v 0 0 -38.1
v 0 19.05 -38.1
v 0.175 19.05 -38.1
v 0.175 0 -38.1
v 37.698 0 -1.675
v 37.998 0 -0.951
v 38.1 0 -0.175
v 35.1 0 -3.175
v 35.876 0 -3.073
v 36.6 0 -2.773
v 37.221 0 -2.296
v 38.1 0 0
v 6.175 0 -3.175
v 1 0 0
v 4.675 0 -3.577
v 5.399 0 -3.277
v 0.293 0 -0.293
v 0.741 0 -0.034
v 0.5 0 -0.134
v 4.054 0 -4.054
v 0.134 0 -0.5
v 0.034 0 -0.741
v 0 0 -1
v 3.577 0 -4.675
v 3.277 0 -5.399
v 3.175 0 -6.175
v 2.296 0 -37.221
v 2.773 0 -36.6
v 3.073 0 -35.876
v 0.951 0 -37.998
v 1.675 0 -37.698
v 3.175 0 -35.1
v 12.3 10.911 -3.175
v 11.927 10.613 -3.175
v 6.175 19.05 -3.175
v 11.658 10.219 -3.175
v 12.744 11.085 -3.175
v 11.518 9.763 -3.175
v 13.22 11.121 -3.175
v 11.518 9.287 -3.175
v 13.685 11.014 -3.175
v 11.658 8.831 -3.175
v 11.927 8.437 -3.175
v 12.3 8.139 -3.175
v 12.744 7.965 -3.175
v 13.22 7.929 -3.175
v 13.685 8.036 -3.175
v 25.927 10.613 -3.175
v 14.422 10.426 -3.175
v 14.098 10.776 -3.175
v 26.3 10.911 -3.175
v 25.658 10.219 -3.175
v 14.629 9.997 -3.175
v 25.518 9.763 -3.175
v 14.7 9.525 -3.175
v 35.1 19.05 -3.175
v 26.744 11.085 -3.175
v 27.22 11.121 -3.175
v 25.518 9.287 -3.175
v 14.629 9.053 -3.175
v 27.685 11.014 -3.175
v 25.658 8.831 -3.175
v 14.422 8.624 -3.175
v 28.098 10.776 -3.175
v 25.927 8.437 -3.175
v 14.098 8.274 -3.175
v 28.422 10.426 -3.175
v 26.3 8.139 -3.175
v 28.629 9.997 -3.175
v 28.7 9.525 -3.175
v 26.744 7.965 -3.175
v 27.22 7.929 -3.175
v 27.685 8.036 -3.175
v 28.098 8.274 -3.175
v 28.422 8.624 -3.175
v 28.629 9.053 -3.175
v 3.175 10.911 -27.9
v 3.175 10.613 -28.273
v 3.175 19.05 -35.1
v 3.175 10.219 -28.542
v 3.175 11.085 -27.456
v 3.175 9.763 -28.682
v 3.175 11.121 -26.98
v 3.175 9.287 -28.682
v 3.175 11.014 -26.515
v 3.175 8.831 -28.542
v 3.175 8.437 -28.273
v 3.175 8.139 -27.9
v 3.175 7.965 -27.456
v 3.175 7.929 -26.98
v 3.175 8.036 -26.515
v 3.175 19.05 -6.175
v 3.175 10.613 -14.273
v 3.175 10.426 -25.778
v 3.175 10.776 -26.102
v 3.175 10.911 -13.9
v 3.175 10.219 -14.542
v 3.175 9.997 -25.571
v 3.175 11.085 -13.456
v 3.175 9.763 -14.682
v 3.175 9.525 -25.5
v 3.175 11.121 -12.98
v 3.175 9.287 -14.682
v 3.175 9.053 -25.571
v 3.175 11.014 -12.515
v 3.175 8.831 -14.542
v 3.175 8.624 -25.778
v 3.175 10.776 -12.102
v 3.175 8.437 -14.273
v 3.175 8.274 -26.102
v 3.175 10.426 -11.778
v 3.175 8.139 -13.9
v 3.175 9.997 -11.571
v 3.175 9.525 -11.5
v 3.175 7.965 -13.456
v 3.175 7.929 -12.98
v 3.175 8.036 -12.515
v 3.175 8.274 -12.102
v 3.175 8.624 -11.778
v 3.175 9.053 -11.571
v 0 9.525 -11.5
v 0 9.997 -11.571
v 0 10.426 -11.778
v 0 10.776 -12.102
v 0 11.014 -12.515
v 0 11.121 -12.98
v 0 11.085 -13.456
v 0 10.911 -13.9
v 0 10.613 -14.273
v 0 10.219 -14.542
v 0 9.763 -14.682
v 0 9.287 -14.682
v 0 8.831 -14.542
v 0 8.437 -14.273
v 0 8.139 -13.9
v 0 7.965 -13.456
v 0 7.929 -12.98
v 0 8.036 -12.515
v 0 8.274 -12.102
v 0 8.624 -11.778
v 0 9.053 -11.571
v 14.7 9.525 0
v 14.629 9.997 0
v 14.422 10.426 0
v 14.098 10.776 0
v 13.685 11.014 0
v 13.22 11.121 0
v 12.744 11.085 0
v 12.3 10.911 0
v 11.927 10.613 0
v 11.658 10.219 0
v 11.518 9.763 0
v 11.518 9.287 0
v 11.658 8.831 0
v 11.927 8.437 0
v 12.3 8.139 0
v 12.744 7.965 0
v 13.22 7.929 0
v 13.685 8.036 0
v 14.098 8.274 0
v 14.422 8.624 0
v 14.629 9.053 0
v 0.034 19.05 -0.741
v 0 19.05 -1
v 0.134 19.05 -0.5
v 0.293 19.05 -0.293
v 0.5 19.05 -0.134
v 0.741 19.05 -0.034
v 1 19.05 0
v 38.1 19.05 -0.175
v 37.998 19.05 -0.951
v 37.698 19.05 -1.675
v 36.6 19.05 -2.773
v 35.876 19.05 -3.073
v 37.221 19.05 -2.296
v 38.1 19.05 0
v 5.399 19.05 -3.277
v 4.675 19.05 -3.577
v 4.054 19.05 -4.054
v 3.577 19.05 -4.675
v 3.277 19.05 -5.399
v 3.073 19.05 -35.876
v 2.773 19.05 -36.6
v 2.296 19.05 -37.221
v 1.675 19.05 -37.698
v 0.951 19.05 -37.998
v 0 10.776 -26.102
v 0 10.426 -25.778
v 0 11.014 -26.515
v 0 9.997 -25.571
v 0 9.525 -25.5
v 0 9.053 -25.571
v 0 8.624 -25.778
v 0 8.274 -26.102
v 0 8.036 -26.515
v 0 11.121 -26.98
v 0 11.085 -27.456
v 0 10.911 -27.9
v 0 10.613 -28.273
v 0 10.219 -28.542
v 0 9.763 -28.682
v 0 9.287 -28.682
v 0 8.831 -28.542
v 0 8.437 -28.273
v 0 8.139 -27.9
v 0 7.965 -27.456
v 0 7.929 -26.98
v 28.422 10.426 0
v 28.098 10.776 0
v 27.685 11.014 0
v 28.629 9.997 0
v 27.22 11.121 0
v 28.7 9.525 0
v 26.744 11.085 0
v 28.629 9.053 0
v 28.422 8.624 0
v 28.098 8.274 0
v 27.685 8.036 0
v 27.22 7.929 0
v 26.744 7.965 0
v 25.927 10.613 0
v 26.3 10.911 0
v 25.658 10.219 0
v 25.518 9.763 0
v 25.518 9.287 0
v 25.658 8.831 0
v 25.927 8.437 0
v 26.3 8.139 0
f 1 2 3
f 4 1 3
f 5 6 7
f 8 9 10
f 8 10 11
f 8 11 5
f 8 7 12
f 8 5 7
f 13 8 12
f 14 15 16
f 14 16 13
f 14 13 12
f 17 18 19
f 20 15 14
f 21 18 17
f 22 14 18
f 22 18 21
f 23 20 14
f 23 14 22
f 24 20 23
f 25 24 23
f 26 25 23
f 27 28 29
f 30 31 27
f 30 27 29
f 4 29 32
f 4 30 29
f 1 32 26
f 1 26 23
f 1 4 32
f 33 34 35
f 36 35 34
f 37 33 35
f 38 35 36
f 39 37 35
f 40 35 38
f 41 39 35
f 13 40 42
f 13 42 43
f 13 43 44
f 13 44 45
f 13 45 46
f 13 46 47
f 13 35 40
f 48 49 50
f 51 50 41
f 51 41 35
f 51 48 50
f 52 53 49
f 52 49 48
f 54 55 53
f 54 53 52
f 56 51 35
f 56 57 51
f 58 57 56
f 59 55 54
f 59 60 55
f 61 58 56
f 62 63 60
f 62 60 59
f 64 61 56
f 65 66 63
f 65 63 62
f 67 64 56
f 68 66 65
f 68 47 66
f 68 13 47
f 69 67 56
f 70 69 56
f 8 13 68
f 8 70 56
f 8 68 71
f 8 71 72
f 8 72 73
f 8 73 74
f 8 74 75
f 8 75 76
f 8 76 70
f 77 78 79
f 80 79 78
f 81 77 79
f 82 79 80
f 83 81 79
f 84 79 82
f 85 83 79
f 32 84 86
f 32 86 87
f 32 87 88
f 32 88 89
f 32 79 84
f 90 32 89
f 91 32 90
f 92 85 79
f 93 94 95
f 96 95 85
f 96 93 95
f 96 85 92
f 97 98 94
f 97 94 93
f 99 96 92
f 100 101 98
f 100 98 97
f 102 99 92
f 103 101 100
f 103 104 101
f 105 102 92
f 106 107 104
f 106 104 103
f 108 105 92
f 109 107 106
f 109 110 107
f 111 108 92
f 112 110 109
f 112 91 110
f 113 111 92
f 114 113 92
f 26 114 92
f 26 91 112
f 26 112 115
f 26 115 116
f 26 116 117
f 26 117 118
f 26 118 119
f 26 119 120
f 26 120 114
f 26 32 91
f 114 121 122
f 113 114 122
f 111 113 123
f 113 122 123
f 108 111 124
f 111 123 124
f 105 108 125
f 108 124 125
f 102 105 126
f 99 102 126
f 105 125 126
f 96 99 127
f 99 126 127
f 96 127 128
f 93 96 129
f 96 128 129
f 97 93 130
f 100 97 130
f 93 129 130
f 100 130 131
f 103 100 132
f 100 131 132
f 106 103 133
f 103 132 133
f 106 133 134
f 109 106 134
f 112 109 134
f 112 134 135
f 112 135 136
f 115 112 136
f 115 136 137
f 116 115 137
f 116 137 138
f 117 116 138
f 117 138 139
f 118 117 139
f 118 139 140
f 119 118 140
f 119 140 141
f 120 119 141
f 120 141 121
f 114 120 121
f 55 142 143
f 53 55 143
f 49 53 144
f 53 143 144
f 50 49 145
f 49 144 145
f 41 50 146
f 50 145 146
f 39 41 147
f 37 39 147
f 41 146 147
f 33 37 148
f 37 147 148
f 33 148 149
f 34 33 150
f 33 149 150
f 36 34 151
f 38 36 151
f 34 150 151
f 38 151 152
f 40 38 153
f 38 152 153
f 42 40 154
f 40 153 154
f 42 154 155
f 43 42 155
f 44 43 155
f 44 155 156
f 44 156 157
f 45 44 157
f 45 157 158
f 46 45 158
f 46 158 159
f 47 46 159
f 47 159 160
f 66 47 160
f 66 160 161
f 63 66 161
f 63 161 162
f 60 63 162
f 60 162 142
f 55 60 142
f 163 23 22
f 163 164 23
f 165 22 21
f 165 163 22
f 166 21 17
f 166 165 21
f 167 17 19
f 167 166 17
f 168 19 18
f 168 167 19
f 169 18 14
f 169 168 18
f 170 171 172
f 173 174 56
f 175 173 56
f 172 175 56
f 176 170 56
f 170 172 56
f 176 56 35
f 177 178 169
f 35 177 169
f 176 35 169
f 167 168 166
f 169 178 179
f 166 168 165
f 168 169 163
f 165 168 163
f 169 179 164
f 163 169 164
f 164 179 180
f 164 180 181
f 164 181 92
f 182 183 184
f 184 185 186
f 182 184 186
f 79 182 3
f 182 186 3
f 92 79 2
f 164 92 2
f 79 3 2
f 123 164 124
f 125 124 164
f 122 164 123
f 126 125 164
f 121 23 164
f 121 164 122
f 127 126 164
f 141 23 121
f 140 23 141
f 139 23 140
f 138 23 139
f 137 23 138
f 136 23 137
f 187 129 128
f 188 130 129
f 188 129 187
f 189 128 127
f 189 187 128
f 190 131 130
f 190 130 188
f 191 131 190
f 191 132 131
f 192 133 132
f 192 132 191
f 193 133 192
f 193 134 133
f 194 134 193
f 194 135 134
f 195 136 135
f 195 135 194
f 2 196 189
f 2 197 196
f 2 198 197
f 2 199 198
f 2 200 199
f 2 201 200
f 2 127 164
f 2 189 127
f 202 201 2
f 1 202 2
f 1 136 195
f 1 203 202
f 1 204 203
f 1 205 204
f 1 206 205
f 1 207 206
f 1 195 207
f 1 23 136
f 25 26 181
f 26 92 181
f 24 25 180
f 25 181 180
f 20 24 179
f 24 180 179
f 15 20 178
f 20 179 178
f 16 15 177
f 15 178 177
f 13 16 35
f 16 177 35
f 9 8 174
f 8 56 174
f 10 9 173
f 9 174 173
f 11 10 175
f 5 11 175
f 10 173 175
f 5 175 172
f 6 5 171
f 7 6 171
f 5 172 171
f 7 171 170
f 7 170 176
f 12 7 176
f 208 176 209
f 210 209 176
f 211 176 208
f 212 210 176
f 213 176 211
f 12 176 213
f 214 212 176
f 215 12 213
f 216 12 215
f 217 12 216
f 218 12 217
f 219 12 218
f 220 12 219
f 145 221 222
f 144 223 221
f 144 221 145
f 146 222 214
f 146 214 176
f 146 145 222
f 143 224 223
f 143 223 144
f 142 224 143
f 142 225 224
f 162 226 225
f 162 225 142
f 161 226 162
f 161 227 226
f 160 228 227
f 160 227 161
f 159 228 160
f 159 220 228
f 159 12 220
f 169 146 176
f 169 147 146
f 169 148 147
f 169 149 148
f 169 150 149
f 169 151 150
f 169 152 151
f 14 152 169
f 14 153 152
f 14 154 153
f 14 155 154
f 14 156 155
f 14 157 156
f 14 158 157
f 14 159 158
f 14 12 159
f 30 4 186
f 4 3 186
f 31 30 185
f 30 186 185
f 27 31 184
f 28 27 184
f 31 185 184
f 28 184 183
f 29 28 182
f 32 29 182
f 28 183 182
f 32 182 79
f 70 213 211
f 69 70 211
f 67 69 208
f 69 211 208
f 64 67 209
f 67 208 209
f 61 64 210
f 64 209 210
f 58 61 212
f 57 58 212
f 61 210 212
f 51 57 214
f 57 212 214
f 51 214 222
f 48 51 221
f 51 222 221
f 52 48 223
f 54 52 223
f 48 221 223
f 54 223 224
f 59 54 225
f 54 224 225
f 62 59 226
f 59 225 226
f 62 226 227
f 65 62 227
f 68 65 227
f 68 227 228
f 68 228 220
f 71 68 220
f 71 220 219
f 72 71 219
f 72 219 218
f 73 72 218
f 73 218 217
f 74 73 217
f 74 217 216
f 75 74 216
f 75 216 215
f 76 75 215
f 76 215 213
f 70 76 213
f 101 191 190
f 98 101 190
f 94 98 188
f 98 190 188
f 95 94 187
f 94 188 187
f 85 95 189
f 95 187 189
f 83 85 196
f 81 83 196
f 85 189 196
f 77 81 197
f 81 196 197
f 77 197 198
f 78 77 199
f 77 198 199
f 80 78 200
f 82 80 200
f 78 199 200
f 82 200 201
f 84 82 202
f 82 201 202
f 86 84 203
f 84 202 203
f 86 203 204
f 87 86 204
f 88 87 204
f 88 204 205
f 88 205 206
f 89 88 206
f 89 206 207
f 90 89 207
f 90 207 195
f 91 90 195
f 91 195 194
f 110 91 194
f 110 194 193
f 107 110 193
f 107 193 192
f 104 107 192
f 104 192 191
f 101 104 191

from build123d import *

# Parameters (mm, degrees)
BOSS_EXTRUDE1_DEPTH = 19.05
FILLET1_R           = 3
FILLET2_R           = 1
SKETCH2_R           = 1.6
CUT_EXTRUDE1_DEPTH  = 58.15
SKETCH3_R           = 1.6
CUT_EXTRUDE2_DEPTH  = 58.15


with BuildPart() as part:
    # Sketch1 → Boss-Extrude1 (new body)
    with BuildSketch(Plane(origin=(0, 0, 0), x_dir=(1, 0, 0), z_dir=(0, 1, 0))):
        Polygon((0, 0), (0, 38.1), (3.175, 38.1), (3.175, 3.175), (38.1, 3.175), (38.1, 0), align=None)
    extrude(amount=BOSS_EXTRUDE1_DEPTH)

    # Fillet1
    fillet1_edges = [part.edges().sort_by_distance(p)[0] for p in [
        (3.175, 9.525, -38.1),
        (3.175, 9.525, -3.175),
        (38.1, 9.525, -3.175),
    ]]
    fillet(fillet1_edges, radius=FILLET1_R)

    # Fillet2
    fillet2_edges = [part.edges().sort_by_distance(p)[0] for p in [
        (0, 9.525, 0),
    ]]
    fillet(fillet2_edges, radius=FILLET2_R)

    # Sketch2 → Cut-Extrude1 (cut, through all)
    with BuildSketch(Plane.XY):
        with Locations((13.1, 9.525)):
            Circle(SKETCH2_R)
        with Locations((27.1, 9.525)):
            Circle(SKETCH2_R)
    extrude(amount=-CUT_EXTRUDE1_DEPTH, mode=Mode.SUBTRACT)

    # Sketch3 → Cut-Extrude2 (cut, through all)
    with BuildSketch(Plane.ZY):
        with Locations((-27.1, 9.525)):
            Circle(SKETCH3_R)
        with Locations((-13.1, 9.525)):
            Circle(SKETCH3_R)
    extrude(amount=-CUT_EXTRUDE2_DEPTH, mode=Mode.SUBTRACT)


solid = part.part
